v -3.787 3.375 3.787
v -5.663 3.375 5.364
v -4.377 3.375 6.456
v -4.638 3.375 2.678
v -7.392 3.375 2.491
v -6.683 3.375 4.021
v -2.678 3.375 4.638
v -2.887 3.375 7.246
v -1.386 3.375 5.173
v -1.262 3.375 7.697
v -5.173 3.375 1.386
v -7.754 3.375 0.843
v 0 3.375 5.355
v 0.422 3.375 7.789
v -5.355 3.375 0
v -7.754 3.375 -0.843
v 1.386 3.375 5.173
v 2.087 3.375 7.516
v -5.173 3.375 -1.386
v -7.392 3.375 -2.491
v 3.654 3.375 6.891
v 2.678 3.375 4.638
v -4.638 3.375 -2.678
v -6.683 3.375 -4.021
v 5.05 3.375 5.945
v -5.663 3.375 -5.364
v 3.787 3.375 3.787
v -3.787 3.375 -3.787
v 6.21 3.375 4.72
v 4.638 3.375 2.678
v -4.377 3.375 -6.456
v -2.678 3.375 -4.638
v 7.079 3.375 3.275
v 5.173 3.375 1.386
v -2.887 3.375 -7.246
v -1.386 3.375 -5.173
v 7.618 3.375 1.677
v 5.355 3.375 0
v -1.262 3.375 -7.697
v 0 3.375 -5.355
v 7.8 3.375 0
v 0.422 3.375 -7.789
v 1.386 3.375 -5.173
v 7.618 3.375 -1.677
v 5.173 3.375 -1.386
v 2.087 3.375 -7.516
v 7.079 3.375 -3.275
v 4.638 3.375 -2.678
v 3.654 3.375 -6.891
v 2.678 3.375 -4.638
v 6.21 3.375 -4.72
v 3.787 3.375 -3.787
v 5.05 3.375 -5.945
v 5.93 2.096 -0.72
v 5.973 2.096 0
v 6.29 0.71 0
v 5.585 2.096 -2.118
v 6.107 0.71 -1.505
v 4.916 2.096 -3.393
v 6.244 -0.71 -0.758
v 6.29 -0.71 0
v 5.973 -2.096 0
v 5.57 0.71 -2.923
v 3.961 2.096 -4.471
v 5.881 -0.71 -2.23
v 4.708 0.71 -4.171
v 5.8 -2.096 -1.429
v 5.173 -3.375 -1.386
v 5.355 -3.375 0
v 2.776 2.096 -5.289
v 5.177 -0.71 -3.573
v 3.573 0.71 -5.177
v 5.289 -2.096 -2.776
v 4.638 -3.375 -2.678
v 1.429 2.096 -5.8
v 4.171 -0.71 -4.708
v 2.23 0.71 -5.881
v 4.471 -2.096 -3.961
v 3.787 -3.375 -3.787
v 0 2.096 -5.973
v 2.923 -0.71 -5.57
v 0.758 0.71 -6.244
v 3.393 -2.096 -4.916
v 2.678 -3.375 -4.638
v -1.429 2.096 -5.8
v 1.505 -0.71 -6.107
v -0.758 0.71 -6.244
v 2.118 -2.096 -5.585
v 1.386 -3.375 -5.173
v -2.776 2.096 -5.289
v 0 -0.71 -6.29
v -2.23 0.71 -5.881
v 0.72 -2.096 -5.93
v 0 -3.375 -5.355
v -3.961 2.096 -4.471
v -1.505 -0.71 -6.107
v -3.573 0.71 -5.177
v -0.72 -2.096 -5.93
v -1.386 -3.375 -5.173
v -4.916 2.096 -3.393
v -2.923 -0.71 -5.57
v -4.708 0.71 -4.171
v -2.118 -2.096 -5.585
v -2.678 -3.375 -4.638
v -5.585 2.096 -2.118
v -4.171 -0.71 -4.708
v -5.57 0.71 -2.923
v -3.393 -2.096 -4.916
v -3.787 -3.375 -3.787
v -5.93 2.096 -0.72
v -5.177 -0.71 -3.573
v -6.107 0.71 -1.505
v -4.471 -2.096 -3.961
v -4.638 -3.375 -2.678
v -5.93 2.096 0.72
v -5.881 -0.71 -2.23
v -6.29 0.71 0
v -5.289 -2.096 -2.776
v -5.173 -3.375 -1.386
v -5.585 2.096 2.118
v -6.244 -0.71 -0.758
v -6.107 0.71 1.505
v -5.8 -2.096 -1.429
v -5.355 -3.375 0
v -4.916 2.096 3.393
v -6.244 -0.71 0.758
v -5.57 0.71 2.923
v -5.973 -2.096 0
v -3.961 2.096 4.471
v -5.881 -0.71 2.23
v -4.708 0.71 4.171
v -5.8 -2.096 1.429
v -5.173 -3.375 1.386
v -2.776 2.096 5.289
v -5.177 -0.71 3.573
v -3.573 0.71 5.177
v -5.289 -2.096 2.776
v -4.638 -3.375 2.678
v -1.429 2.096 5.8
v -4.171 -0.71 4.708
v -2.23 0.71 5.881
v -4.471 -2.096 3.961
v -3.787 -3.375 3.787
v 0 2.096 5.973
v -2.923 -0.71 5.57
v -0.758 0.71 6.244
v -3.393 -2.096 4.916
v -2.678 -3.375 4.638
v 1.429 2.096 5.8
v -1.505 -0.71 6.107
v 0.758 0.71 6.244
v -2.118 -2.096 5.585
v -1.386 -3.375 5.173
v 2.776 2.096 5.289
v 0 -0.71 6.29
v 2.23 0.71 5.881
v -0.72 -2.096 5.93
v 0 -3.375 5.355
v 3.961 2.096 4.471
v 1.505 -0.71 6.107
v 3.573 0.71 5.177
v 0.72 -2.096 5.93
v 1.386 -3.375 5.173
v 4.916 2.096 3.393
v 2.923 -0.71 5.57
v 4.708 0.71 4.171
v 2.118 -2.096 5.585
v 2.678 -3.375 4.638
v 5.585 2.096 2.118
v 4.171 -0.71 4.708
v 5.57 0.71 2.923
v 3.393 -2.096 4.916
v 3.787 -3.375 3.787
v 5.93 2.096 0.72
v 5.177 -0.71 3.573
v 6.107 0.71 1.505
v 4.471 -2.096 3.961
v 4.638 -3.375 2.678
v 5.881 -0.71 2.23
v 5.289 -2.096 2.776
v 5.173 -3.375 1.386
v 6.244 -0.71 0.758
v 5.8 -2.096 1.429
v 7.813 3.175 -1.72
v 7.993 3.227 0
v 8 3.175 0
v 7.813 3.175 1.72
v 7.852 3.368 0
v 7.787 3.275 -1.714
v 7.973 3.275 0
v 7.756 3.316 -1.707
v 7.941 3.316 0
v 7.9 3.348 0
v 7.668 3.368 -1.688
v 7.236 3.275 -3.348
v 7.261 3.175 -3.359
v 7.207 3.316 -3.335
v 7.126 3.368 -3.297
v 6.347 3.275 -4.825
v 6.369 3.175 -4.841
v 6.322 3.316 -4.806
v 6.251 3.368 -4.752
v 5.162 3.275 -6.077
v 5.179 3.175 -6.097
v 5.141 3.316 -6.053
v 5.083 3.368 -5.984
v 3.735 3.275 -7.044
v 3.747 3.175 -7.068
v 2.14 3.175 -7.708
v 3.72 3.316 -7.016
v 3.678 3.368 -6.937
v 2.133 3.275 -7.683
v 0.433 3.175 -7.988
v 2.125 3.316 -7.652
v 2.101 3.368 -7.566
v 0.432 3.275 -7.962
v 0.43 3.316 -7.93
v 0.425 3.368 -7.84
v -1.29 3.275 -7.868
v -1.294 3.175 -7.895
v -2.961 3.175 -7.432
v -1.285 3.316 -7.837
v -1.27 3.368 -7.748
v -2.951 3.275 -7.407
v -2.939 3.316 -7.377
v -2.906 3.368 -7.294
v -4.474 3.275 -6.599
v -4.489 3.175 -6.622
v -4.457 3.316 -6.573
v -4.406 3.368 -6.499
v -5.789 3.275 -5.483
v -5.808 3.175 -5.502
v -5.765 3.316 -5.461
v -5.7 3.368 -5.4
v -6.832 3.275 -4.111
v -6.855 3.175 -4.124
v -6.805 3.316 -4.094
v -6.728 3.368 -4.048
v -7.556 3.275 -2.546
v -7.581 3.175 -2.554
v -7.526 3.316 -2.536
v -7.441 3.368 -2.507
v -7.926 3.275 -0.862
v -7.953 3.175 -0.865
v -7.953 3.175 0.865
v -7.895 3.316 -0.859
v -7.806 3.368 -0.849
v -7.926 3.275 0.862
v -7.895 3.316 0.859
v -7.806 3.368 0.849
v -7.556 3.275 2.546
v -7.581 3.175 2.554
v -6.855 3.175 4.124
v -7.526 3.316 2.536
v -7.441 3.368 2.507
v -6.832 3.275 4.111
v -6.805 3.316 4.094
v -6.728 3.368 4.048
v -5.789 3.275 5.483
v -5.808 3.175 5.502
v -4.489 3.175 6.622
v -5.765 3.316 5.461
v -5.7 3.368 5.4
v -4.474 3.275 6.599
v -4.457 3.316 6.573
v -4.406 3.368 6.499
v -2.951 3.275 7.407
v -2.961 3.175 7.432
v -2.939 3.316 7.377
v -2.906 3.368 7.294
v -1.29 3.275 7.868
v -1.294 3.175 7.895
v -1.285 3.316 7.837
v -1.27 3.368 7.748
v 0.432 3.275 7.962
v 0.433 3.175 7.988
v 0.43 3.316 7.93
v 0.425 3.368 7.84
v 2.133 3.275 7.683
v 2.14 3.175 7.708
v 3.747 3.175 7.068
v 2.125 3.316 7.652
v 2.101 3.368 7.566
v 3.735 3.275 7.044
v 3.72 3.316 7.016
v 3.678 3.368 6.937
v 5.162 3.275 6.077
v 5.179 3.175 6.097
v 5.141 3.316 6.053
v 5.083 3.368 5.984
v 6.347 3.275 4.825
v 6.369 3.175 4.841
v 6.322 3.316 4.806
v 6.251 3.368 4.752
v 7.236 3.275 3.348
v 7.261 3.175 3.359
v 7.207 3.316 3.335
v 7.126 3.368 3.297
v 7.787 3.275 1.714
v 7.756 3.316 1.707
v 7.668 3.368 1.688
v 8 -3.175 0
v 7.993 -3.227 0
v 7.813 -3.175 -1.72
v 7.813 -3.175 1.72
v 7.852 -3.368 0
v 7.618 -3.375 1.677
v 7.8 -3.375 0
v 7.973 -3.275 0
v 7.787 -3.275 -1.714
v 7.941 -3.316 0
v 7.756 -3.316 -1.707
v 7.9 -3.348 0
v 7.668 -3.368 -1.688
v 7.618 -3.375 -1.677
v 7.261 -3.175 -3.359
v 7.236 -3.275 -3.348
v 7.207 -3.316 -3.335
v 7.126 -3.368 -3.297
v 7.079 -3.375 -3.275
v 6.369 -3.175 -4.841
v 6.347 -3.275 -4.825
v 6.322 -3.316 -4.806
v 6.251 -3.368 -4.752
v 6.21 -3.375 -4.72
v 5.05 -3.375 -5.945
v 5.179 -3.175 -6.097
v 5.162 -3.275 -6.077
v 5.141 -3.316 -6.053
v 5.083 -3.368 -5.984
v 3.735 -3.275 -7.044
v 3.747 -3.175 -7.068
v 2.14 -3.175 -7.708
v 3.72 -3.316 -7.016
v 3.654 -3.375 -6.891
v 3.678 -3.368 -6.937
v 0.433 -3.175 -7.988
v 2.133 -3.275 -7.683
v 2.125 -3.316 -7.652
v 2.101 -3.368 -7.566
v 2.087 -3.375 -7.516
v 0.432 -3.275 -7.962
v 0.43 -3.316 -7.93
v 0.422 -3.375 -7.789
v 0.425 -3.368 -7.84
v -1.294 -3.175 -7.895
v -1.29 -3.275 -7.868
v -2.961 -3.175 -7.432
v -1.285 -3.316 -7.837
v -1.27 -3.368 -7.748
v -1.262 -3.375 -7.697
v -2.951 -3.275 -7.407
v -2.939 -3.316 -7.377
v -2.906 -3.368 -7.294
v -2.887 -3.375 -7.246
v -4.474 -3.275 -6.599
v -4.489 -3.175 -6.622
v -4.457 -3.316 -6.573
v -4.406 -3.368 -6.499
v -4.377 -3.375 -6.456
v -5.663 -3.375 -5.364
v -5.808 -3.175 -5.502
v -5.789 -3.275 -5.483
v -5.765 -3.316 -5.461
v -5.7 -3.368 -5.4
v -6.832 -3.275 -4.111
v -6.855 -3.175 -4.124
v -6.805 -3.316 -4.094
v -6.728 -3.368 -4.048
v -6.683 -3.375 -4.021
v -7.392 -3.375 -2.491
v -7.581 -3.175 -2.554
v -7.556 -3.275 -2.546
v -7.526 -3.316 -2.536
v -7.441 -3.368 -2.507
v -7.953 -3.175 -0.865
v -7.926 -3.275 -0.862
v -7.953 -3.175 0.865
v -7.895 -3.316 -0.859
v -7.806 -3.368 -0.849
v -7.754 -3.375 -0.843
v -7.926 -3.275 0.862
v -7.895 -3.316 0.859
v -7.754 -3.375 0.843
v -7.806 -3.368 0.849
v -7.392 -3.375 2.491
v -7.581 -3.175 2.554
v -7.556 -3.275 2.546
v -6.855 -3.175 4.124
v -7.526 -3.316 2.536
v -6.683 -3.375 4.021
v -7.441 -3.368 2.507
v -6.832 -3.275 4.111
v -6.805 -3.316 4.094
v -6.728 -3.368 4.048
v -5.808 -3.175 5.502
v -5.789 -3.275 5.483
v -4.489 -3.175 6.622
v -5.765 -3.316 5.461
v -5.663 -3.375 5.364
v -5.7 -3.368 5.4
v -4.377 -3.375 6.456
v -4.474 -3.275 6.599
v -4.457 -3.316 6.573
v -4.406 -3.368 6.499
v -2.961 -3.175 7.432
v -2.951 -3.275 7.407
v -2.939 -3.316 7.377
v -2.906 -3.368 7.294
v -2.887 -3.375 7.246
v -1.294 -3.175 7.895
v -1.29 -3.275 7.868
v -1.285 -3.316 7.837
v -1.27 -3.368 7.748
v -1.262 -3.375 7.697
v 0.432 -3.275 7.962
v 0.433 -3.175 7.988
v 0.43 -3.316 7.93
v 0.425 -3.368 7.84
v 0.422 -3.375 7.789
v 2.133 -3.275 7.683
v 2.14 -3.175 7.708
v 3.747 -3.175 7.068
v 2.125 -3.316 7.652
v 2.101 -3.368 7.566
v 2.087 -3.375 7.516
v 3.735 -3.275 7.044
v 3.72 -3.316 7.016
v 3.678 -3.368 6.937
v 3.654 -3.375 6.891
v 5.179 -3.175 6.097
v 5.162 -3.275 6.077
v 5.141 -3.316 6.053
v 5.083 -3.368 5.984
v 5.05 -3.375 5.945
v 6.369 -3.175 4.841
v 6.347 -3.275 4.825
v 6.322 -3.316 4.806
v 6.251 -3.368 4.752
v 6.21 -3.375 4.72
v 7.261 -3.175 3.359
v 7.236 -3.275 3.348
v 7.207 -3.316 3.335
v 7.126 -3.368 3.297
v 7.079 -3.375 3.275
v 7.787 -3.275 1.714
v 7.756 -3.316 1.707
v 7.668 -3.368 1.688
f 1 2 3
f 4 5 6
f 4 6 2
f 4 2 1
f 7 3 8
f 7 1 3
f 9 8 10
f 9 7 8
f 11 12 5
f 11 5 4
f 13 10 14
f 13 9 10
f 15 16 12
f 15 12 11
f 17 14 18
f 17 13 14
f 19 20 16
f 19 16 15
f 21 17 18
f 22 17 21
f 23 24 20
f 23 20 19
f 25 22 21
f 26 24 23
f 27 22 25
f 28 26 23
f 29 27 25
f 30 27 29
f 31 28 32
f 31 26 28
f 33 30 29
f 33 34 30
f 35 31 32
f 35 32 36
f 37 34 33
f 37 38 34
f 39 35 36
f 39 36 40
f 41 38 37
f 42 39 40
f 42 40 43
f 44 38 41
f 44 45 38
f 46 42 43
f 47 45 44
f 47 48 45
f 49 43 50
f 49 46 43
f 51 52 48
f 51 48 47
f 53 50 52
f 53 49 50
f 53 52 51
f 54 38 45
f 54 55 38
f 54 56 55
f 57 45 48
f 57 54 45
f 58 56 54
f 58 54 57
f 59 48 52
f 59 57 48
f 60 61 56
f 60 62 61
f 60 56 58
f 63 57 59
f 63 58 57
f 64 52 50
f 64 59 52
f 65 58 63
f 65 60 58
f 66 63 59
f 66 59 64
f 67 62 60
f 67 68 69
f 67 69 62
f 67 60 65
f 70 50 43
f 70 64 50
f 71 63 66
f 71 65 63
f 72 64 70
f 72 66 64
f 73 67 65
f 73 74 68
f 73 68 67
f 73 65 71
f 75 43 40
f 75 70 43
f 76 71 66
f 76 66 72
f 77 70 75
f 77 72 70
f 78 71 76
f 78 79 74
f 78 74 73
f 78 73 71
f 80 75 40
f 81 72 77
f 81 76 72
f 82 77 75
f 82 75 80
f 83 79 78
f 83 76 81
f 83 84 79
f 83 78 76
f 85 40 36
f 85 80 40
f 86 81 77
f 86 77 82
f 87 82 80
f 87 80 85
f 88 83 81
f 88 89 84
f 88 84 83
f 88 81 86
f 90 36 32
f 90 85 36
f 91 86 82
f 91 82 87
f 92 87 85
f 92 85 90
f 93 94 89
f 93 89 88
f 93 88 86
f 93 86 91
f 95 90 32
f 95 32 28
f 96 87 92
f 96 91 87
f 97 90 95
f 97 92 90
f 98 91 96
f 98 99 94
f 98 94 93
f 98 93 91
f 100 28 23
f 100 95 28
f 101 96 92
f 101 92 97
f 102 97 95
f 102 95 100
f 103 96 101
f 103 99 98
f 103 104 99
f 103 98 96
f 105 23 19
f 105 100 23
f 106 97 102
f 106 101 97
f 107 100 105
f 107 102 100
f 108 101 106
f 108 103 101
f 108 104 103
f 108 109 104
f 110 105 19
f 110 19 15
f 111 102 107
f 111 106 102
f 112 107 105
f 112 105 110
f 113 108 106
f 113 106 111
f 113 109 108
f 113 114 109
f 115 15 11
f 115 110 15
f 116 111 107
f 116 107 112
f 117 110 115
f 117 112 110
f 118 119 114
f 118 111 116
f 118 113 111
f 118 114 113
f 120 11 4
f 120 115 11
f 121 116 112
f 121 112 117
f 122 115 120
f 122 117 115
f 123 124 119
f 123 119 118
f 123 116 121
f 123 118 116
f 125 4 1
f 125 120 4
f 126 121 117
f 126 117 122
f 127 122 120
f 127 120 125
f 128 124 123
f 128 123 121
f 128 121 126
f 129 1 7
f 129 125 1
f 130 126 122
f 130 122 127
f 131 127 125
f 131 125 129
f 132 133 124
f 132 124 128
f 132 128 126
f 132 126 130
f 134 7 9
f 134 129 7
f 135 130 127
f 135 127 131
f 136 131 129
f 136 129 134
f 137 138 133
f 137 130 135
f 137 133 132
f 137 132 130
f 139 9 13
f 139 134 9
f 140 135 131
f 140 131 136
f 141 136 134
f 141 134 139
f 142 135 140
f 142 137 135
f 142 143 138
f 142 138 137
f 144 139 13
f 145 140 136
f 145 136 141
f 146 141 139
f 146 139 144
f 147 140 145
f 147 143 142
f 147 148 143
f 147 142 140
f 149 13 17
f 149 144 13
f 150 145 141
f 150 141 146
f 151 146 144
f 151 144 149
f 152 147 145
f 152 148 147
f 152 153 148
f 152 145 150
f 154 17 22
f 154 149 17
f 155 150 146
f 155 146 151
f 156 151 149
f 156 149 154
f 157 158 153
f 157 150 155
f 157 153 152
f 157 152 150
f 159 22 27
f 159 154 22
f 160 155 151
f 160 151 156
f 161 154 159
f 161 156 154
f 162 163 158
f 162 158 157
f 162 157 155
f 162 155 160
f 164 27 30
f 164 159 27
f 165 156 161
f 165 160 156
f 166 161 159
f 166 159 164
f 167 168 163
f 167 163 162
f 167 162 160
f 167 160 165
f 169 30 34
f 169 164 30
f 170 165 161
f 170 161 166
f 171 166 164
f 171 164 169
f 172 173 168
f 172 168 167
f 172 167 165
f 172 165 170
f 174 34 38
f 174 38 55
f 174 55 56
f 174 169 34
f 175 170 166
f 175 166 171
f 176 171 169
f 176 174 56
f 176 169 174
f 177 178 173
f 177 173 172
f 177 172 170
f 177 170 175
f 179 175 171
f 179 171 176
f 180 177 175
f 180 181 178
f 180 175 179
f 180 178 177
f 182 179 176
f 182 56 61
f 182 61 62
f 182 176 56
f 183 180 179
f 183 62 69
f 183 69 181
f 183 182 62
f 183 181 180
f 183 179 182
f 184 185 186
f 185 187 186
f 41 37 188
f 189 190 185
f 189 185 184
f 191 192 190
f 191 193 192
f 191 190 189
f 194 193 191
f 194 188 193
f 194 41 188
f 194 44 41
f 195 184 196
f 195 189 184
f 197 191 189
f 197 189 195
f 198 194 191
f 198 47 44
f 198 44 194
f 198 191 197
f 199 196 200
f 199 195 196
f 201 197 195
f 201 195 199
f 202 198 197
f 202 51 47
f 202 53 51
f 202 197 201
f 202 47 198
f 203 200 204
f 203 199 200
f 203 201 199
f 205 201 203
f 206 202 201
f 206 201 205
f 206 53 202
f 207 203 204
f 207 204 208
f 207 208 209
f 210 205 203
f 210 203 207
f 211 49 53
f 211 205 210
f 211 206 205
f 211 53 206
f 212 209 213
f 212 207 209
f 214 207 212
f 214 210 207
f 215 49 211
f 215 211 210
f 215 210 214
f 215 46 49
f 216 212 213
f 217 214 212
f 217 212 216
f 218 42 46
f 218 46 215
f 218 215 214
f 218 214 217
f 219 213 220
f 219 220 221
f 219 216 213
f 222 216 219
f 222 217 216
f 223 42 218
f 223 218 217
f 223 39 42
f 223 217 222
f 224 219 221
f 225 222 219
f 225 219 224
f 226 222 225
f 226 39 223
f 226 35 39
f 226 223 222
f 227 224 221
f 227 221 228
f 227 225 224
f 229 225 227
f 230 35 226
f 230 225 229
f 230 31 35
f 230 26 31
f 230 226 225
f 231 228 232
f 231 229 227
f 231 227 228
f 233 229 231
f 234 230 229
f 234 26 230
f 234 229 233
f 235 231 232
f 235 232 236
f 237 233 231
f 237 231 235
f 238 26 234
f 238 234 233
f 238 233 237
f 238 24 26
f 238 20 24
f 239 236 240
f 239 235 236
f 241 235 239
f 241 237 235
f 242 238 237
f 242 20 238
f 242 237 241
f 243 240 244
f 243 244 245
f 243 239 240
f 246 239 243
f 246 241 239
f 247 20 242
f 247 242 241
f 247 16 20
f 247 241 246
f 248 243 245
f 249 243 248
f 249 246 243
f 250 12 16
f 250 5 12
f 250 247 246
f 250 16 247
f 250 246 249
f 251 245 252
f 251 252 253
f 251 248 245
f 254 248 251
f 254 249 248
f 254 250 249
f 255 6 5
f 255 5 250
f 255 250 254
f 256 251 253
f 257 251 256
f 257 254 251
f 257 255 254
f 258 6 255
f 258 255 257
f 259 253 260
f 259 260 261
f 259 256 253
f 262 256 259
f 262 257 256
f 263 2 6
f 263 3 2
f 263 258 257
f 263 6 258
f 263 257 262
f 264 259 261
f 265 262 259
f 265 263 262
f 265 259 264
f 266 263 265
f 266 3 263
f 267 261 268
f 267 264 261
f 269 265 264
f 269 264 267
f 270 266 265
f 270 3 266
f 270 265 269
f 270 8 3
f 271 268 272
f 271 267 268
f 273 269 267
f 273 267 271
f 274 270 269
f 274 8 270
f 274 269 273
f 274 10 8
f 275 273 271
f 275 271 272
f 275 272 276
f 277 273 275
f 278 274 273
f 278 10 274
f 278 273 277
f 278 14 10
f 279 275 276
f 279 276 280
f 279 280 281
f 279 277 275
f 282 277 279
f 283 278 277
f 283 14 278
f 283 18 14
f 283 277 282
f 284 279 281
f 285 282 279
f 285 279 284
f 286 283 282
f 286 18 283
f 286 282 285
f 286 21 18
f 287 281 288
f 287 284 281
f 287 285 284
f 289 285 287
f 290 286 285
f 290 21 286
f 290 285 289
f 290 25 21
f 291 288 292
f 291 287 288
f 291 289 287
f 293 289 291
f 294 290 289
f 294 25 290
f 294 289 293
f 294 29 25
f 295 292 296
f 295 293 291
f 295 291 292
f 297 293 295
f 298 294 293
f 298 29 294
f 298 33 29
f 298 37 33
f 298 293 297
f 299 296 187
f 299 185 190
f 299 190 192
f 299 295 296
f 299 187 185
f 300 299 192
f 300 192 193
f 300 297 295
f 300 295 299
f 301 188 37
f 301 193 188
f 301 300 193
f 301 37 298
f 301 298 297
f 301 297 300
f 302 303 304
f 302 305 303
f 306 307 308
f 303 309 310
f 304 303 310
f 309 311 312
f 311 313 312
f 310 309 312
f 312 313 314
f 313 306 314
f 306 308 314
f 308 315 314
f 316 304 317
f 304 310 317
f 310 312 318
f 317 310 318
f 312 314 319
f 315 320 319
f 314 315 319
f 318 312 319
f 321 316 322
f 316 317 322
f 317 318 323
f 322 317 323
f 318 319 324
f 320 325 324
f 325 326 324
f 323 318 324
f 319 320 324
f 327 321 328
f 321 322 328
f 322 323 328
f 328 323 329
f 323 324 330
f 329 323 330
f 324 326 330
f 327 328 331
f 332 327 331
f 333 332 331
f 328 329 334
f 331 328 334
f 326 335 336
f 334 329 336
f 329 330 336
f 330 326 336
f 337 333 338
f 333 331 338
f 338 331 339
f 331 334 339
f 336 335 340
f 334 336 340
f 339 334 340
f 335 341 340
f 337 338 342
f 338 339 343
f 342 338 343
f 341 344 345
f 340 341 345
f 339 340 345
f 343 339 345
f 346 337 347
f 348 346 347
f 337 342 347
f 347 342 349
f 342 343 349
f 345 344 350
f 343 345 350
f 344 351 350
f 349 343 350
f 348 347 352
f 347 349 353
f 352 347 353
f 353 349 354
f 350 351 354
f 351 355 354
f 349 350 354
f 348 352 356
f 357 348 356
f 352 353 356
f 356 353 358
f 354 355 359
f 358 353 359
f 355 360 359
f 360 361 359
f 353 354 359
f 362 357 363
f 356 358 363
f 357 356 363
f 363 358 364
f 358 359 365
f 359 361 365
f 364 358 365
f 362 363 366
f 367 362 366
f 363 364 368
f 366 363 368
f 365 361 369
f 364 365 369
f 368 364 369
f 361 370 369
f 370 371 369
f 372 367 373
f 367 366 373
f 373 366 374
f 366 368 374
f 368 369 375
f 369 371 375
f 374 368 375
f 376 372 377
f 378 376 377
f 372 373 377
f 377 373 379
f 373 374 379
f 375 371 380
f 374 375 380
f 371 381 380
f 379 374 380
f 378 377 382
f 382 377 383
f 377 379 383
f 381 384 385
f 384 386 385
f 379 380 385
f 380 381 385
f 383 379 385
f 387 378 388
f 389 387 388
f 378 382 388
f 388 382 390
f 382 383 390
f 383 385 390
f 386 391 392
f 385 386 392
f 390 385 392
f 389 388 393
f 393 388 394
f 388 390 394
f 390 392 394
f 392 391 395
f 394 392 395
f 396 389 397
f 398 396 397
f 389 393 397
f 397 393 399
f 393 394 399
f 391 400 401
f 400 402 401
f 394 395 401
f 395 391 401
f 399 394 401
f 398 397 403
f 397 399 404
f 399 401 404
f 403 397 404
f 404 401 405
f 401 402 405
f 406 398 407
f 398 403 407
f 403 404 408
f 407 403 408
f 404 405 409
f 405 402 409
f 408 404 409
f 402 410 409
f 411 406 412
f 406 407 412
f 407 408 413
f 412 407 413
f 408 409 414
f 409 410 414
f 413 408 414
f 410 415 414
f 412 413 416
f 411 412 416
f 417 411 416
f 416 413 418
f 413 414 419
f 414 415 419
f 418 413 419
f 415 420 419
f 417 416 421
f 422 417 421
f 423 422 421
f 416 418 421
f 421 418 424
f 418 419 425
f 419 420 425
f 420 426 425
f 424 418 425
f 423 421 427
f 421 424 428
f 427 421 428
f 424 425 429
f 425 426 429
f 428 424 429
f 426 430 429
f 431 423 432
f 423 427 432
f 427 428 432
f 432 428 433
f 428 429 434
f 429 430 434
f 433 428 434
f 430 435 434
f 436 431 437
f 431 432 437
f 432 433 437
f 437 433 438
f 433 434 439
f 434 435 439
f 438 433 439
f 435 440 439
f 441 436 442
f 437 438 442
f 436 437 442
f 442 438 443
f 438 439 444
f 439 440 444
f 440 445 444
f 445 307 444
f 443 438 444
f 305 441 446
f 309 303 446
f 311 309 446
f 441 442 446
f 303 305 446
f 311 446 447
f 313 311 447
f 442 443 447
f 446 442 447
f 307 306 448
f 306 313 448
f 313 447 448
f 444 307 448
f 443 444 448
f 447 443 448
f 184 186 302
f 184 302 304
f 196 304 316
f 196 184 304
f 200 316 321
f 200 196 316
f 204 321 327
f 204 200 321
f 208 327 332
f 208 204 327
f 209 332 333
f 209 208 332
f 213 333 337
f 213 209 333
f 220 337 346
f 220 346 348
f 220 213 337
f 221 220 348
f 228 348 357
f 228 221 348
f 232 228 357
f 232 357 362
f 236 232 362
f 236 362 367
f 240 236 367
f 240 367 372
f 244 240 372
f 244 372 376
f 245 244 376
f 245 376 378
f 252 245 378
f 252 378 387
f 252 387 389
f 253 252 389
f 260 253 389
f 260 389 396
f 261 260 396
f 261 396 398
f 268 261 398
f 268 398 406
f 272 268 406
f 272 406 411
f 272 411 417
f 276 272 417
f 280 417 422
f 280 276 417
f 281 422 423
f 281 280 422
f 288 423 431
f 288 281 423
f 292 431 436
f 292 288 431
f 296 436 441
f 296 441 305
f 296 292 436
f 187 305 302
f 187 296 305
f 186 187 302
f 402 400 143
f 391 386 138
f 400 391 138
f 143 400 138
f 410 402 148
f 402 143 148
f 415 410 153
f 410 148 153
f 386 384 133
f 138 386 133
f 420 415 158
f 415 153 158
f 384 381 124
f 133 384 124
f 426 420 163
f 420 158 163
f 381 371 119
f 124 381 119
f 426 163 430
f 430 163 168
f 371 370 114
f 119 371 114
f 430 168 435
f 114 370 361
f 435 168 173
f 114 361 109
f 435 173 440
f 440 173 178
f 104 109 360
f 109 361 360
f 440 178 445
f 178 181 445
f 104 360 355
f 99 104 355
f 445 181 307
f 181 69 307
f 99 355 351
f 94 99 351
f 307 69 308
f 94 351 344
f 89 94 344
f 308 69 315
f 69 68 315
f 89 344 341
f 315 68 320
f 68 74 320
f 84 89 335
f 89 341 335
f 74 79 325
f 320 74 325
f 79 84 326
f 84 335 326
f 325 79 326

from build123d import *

# Parameters (mm, degrees)
SZKIC1_R                    = 8
DODANIE_WYCI_GNI_CIE1_DEPTH = 3.375
ZAOKR_GLENIE1_R             = 0.2


with BuildPart() as part:
    # Szkic1 → Dodanie-wyciągnięcie1 (new body, symmetric)
    with BuildSketch(Plane(origin=(0, 0, 0), x_dir=(1, 0, 0), z_dir=(0, 1, 0))):
        Circle(SZKIC1_R)
    extrude(amount=DODANIE_WYCI_GNI_CIE1_DEPTH, both=True)

    # Szkic3 → Wycięcie-obrót1 (revolve, cut)
    with BuildSketch(Plane.XY):
        with BuildLine():
            Line((0, -6.33), (0, 6.33))
            ThreePointArc((0, 6.33), (6.33, 0), (0, -6.33))
        make_face()
    revolve(axis=Axis((0, -6.33, 0), (0, 1, 0)), mode=Mode.SUBTRACT)

    # Zaokrąglenie1
    zaokr_glenie1_edges = [part.edges().sort_by_distance(p)[0] for p in [
        (-8, -3.375, 0),
        (-8, 3.375, 0),
    ]]
    fillet(zaokr_glenie1_edges, radius=ZAOKR_GLENIE1_R)


solid = part.part
